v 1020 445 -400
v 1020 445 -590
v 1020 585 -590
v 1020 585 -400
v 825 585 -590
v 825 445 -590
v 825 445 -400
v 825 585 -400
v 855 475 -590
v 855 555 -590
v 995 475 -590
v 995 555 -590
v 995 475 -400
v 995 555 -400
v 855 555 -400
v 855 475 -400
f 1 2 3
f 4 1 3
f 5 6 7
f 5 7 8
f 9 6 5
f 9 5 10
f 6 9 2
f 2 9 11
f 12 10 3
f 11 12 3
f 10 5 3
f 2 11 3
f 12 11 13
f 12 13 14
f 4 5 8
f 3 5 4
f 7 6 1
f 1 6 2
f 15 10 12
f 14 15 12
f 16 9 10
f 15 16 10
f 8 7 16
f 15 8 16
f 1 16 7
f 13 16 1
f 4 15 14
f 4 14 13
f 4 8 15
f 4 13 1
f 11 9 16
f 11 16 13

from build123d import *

# Parameters (mm, degrees)
BOX101_W     = 140
BOX101_H     = 80
BOX101_DEPTH = 190
BOX102_W     = 140
BOX102_H     = 80
BOX102_DEPTH = 190
BOX103_W     = 195
BOX103_H     = 140
BOX103_DEPTH = 190


with BuildPart() as cube073:
    # Box101 → Box101 (new body)
    with BuildSketch(Plane(origin=(220, 30, 0), x_dir=(1, 0, 0), z_dir=(0, 0, 1))):
        with Locations((70, 40)):
            Rectangle(BOX101_W, BOX101_H)
    extrude(amount=BOX101_DEPTH)


with BuildPart() as fusion017:
    # Box102 → Box102 (new body)
    with BuildSketch(Plane(origin=(30, 30, 0), x_dir=(1, 0, 0), z_dir=(0, 0, 1))):
        with Locations((70, 40)):
            Rectangle(BOX102_W, BOX102_H)
    extrude(amount=BOX102_DEPTH)

    # Fusion017: union Cube073
    add(cube073.part)


with BuildPart() as halve_snelbouwsteen001:
    # Box103 → Box103 (new body)
    with BuildSketch(Plane.XY):
        with Locations((97.5, 70)):
            Rectangle(BOX103_W, BOX103_H)
    extrude(amount=BOX103_DEPTH)

    # Cut012: cut Fusion017
    add(fusion017.part, mode=Mode.SUBTRACT)


with BuildPart() as halve_snelbouwsteen001_1:
    # Cut012 placement: moved
    add(halve_snelbouwsteen001.part.moved(Location((825, 445, -590))))


solid = halve_snelbouwsteen001_1.part
